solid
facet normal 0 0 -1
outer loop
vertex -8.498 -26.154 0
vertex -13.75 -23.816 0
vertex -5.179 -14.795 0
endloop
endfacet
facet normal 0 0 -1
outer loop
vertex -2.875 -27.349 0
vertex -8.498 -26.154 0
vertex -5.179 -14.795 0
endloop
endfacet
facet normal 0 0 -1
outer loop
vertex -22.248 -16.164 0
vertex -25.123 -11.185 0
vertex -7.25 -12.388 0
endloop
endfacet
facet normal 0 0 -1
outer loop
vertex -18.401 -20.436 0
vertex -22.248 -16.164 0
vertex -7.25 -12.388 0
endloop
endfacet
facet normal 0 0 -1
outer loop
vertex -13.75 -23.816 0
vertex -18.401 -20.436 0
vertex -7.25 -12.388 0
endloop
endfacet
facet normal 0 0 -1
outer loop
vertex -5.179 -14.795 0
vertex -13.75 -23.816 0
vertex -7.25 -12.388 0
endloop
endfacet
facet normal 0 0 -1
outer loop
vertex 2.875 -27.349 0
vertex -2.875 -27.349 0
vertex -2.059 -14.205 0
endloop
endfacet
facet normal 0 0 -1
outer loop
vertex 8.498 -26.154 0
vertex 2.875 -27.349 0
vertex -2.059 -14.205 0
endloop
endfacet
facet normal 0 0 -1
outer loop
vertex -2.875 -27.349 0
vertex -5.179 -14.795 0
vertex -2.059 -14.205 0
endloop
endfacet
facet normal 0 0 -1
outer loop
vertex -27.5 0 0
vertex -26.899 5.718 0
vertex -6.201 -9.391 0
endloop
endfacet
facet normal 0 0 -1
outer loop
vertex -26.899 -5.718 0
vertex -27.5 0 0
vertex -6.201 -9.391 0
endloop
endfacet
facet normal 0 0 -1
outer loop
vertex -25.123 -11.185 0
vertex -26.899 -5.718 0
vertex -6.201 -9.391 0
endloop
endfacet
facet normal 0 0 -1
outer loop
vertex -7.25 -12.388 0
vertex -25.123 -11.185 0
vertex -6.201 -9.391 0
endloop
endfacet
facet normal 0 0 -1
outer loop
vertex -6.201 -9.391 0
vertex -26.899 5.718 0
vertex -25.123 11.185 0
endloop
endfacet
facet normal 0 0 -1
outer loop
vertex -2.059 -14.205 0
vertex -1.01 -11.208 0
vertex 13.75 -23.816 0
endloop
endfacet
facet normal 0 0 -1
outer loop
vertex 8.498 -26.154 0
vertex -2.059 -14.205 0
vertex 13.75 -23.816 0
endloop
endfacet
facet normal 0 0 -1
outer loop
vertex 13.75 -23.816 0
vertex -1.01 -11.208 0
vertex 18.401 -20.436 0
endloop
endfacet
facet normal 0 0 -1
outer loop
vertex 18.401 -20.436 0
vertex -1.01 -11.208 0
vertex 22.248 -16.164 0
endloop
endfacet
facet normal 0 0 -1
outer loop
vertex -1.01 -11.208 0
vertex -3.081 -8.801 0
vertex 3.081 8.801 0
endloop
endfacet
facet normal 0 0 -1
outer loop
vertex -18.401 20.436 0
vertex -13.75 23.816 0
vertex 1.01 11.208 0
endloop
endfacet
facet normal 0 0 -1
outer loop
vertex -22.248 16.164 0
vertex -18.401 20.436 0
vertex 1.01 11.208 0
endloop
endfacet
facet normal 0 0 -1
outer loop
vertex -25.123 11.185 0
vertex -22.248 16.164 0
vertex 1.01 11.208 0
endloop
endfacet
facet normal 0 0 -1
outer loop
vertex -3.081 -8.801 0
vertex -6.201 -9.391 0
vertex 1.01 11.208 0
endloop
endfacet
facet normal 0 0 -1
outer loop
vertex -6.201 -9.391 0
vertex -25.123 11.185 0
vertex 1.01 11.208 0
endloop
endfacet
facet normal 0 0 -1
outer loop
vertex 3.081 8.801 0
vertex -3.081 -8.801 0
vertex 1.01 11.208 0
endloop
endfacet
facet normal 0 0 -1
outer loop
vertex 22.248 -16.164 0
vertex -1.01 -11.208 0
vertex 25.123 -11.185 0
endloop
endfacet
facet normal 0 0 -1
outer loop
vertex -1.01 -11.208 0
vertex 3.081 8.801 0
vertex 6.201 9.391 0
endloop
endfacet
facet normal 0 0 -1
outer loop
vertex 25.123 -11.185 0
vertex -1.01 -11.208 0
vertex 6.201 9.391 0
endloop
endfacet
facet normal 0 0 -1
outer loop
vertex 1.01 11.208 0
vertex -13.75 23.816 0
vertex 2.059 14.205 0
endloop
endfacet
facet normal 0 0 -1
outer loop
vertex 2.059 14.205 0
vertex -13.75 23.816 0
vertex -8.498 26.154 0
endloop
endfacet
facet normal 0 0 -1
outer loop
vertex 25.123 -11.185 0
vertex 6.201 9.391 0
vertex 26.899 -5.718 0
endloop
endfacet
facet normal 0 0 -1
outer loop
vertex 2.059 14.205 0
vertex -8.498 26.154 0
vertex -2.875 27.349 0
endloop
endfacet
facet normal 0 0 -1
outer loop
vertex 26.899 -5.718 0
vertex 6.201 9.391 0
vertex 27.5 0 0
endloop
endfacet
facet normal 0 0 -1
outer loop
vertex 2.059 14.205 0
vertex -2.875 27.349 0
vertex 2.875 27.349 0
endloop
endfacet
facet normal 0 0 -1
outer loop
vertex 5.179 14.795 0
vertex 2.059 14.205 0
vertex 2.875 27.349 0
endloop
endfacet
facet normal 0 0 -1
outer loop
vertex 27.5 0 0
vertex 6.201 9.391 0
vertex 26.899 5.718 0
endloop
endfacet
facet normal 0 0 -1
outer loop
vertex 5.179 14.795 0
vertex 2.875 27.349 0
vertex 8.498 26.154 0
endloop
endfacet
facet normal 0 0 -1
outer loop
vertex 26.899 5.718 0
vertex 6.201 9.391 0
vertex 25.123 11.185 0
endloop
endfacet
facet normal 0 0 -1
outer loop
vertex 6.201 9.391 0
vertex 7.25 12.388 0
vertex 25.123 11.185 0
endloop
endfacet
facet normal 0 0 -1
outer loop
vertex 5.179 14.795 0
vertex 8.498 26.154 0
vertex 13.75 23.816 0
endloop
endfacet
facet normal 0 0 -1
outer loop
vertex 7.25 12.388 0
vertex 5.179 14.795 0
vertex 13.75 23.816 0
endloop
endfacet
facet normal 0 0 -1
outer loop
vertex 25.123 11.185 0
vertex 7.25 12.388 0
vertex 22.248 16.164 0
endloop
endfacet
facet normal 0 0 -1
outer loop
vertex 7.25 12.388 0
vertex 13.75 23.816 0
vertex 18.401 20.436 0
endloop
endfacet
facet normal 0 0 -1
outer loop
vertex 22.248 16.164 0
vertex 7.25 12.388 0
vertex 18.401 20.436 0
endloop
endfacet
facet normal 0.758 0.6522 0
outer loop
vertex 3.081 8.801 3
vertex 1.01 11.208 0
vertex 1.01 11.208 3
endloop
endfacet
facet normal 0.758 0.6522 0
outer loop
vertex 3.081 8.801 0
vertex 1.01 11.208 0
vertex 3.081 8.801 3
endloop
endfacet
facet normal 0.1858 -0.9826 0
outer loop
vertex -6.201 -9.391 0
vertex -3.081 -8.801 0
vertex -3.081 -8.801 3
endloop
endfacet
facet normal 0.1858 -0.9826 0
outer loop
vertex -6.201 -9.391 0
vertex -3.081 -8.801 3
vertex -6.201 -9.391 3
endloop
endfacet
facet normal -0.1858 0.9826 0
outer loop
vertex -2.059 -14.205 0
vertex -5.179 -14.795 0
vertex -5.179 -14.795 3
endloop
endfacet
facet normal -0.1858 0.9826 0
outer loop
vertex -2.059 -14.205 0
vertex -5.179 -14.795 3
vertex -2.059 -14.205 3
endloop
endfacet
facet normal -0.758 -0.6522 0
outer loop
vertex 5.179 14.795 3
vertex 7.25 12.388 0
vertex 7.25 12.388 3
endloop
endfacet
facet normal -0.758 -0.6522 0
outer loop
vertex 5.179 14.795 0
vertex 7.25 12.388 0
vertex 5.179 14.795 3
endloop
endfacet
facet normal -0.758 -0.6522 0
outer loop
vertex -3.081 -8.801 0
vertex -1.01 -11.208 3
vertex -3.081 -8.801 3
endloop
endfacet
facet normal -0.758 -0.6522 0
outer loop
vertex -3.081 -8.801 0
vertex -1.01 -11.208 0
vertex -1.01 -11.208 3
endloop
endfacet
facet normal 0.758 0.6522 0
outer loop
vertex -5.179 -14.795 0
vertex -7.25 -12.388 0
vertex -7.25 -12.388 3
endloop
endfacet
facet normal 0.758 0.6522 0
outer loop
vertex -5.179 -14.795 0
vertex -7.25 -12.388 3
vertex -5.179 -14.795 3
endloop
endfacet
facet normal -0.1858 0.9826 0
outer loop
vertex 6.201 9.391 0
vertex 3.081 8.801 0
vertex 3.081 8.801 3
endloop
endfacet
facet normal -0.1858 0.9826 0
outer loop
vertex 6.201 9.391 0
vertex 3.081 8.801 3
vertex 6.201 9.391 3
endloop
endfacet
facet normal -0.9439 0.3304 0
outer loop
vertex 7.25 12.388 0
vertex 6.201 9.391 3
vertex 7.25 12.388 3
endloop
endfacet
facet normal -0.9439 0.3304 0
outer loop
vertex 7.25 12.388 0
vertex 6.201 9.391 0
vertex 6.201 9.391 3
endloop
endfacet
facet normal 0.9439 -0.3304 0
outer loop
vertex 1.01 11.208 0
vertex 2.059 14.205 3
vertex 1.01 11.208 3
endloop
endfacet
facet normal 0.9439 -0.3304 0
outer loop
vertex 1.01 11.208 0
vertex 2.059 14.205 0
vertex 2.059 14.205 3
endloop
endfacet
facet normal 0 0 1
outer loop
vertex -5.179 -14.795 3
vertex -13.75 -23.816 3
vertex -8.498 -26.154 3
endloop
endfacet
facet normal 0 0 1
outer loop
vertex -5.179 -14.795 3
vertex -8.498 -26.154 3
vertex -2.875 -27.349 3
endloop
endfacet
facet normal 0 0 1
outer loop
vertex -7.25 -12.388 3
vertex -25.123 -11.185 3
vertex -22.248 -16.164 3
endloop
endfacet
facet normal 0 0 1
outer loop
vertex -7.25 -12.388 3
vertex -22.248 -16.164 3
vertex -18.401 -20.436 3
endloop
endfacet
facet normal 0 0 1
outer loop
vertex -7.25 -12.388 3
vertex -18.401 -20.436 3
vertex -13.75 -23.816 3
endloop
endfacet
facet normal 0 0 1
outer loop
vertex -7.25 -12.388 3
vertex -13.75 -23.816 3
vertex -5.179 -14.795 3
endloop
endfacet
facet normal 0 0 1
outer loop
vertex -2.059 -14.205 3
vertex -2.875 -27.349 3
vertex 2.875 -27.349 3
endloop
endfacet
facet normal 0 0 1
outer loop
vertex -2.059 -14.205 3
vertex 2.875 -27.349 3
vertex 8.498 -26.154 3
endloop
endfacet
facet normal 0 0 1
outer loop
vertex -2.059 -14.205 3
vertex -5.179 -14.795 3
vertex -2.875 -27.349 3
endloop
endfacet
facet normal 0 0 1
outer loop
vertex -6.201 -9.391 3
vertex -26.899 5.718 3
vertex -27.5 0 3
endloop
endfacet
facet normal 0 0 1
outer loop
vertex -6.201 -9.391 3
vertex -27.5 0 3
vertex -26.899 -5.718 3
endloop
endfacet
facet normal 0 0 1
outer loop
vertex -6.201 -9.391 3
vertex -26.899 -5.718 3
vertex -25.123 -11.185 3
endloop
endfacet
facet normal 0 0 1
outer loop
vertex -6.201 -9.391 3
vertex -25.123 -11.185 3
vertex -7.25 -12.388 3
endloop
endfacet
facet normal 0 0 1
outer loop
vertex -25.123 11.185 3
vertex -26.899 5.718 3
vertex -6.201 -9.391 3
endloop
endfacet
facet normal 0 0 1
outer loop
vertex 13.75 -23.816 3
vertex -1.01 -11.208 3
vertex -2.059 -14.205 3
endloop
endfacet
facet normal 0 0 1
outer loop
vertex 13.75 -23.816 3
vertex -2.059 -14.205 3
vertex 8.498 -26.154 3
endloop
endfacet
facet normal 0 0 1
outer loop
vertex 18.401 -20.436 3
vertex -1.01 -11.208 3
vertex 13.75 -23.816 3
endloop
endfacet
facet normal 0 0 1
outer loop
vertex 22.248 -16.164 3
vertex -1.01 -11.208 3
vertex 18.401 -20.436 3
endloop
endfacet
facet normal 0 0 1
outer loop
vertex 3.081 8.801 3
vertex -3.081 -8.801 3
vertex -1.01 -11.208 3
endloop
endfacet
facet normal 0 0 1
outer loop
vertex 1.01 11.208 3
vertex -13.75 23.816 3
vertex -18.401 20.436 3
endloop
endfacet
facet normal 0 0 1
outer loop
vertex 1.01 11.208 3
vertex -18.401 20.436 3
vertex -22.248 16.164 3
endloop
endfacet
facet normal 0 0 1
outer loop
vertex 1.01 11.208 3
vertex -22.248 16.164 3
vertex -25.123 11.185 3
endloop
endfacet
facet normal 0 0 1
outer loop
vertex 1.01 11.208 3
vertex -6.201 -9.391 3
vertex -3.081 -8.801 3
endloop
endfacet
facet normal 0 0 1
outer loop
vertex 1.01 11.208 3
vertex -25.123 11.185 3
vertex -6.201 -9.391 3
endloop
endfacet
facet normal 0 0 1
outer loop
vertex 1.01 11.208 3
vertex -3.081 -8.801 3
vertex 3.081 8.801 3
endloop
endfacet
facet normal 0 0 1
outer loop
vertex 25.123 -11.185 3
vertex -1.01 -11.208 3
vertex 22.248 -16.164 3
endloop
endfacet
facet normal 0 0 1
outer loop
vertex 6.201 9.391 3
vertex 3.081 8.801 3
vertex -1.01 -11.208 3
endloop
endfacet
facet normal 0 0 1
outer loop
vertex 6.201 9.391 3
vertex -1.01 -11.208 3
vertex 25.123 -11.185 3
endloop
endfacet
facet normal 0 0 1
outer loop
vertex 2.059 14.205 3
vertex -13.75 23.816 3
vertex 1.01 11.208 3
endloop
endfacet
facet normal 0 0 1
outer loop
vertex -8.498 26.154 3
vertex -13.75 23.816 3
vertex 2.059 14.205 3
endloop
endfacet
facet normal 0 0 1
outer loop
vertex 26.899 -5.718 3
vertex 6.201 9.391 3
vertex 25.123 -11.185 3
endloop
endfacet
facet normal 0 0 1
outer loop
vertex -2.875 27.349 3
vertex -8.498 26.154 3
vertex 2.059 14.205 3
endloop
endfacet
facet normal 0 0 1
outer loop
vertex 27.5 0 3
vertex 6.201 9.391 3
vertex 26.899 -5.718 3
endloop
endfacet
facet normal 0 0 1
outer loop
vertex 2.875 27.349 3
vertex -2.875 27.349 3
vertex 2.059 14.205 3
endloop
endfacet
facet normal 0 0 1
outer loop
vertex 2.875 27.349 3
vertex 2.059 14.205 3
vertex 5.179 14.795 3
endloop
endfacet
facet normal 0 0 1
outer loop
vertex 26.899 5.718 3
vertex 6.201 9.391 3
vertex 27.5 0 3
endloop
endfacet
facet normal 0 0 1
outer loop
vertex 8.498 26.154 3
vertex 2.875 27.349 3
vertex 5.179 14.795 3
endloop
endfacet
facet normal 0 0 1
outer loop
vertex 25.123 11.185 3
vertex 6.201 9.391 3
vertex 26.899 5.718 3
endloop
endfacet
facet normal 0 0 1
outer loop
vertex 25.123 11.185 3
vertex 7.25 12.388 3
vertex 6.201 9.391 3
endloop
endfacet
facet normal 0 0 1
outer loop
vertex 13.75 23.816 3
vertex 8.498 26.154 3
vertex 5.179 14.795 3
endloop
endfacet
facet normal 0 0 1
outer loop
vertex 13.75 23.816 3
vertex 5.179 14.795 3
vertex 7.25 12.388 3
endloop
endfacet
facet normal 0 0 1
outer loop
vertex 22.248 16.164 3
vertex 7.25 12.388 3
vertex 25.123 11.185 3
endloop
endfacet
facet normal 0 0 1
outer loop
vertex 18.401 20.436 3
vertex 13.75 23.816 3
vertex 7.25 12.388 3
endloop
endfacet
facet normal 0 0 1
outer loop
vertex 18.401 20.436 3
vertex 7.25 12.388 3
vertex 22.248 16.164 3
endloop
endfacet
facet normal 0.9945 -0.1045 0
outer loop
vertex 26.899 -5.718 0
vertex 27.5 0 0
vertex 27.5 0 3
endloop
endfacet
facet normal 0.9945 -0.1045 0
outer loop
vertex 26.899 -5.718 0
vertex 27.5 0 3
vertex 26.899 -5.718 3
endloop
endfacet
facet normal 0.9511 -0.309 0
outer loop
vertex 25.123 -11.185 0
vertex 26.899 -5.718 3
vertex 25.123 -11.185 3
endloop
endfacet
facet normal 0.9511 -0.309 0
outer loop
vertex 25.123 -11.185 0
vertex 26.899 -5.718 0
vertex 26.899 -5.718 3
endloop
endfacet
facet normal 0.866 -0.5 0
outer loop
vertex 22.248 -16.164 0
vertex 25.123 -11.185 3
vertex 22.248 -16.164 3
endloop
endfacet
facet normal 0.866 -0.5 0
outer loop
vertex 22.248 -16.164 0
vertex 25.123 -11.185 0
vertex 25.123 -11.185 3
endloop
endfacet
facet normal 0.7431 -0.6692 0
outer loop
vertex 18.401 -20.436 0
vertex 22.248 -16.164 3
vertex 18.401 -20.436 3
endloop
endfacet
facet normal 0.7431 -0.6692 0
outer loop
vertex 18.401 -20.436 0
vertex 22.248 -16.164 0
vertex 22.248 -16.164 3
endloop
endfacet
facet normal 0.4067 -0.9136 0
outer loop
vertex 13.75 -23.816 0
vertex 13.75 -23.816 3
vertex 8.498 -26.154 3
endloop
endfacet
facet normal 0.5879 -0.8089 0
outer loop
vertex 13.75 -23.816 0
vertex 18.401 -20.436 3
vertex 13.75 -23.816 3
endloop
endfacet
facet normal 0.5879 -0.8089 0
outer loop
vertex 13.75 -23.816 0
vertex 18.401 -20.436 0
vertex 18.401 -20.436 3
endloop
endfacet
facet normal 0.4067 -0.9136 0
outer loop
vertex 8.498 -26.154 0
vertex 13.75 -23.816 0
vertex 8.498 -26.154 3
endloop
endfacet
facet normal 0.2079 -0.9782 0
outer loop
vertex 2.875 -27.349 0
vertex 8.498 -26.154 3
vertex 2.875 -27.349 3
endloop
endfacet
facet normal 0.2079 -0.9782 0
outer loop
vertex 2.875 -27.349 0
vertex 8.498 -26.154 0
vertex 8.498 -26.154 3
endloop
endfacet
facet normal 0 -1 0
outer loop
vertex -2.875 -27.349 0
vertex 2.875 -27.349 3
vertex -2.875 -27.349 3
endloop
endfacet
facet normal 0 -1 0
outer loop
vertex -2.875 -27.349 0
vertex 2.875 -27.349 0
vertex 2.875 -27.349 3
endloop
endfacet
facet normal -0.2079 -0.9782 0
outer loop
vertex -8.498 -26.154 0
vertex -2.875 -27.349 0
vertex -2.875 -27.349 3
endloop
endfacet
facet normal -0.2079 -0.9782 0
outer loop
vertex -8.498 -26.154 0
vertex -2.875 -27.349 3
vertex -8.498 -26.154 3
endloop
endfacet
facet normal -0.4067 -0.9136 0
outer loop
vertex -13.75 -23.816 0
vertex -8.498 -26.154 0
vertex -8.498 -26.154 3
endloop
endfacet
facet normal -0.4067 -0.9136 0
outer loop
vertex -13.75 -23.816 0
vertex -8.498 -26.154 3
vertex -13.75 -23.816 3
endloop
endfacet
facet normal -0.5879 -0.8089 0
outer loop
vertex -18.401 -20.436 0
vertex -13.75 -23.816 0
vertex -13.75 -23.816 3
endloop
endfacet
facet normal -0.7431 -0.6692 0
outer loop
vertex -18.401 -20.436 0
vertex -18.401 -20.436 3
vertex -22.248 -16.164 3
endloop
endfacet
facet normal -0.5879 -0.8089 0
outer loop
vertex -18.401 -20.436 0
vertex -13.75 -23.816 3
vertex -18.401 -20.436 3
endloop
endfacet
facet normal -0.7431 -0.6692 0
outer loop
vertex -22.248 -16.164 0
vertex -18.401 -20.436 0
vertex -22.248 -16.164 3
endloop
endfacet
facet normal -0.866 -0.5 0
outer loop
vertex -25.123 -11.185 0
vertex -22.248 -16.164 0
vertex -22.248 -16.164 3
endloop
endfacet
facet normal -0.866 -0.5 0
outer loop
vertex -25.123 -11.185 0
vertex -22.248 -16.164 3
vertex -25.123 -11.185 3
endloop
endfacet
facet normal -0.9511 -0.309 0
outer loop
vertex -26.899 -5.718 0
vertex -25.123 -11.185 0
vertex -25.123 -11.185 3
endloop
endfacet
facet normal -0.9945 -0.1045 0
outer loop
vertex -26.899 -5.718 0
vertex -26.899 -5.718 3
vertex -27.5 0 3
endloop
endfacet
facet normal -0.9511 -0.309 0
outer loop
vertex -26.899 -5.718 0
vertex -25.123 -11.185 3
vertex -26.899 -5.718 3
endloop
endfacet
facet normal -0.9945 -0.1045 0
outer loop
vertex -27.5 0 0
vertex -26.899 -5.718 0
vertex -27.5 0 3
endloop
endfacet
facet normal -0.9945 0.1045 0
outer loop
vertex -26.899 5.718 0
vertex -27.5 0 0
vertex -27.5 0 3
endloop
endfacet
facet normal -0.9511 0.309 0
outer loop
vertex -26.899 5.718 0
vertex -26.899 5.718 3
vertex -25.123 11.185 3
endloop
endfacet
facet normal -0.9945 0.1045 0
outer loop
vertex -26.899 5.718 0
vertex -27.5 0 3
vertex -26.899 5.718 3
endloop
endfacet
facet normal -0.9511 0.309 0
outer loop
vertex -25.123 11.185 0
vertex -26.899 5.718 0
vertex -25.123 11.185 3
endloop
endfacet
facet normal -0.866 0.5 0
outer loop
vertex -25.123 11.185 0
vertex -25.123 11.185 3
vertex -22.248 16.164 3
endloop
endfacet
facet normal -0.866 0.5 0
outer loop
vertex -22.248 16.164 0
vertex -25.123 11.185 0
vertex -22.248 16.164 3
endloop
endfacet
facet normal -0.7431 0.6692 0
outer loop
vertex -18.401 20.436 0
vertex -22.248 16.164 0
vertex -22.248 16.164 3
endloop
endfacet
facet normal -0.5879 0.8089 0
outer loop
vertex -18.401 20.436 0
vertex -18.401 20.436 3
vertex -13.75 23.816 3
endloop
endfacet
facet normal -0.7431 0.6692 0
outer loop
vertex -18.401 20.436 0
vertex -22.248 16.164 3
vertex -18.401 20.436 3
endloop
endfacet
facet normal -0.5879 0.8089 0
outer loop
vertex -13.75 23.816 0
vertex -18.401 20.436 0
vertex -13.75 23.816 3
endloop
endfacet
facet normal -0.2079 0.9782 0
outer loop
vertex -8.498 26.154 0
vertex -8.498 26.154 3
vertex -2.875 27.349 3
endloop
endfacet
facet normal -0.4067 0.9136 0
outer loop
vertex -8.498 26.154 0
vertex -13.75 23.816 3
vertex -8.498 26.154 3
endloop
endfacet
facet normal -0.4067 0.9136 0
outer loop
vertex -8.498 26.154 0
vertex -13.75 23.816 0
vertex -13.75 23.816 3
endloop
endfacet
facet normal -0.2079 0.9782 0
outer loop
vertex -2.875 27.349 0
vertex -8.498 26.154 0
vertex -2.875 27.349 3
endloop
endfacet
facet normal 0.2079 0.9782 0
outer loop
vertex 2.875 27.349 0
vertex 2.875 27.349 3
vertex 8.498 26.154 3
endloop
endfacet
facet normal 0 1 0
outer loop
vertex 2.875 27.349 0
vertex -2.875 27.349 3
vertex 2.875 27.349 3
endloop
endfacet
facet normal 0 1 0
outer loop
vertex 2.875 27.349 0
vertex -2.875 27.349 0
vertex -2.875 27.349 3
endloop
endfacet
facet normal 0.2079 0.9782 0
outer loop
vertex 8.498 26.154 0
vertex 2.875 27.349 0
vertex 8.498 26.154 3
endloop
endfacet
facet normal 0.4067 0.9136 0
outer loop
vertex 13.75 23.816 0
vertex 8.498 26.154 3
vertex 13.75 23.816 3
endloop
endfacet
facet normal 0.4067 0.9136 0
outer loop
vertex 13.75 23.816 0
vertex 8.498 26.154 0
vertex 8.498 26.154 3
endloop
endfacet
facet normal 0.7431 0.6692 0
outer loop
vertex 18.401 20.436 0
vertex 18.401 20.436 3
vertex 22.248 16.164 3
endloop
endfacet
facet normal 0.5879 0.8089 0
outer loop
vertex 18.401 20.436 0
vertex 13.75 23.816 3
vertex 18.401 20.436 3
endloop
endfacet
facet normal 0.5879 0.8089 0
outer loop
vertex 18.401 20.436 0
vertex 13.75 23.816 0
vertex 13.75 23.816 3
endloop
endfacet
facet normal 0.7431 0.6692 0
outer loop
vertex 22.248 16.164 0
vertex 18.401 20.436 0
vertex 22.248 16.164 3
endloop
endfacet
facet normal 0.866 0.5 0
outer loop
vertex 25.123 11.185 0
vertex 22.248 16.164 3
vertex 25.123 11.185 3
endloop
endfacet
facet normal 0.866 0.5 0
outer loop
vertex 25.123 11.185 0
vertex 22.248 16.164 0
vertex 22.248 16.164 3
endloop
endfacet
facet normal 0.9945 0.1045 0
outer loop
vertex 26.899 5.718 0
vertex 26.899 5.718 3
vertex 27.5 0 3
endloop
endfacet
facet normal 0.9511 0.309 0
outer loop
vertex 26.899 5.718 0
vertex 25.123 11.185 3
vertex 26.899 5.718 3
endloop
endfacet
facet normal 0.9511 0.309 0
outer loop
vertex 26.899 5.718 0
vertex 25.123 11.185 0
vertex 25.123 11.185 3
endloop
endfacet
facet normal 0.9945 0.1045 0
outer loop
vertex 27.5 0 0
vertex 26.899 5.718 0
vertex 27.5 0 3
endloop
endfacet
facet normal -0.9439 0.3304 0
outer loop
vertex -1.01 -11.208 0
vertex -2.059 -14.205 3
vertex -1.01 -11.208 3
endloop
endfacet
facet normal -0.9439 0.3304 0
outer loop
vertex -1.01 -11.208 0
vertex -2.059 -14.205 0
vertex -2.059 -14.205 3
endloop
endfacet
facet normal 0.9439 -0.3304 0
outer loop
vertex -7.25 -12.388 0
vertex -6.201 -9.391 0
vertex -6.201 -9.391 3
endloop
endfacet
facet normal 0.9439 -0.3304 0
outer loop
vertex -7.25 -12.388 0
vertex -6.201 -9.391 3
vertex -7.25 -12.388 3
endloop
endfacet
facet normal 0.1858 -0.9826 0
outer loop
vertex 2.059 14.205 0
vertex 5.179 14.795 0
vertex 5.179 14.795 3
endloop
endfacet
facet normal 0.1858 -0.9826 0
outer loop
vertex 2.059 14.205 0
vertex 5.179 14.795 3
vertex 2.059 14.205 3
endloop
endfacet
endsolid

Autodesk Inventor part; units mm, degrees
ref_plane "YZ Plane" through (0, 0, 0) normal (1, 0, 0) x (0, 1, 0)
ref_plane "XZ Plane" through (0, 0, 0) normal (0, 1, 0) x (-1, 0, 0)
ref_plane "XY Plane" through (0, 0, 0) normal (0, 0, 1) x (1, 0, 0)
sketch "Sketch1" plane through (0, 0, 0) normal (0, 0, 1) x (1, 0, 0)
  circle A0 centre (0, 0) radius 27.5
  dimension "d0" = 55
extrude "Extrusion1" add sketch "Sketch1" along normal blind 3
sketch "Sketch2" plane through (0, 0, 0) normal (0, 0, -1) x (-1, 0, 0)
  circle A0 centre (-4.1302, 11.7979) radius 1.5 construction
  circle A1 centre (4.1302, -11.7979) radius 1.5 construction
  line L0 (-2.0593, 14.2051) -> (-1.0101, 11.208)
  line L1 (-1.0101, 11.208) -> (-3.081, 8.8009)
  line L2 (-3.081, 8.8009) -> (-6.2011, 9.3908)
  line L3 (-6.2011, 9.3908) -> (-7.2504, 12.3878)
  line L4 (-7.2504, 12.3878) -> (-5.1794, 14.795)
  line L5 (-5.1794, 14.795) -> (-2.0593, 14.2051)
  line L6 (6.2011, -9.3908) -> (7.2504, -12.3878)
  line L7 (7.2504, -12.3878) -> (5.1794, -14.795)
  line L8 (5.1794, -14.795) -> (2.0593, -14.2051)
  line L9 (2.0593, -14.2051) -> (1.0101, -11.208)
  line L10 (1.0101, -11.208) -> (3.081, -8.8009)
  line L11 (3.081, -8.8009) -> (6.2011, -9.3908)
  dimension "d7" = 5.5
  dimension "d8" = 5.5
extrude "Extrusion2" cut sketch "Sketch2" against normal up to next
equation "\"d8\" = d7"
properties part number "BottomHolder"
